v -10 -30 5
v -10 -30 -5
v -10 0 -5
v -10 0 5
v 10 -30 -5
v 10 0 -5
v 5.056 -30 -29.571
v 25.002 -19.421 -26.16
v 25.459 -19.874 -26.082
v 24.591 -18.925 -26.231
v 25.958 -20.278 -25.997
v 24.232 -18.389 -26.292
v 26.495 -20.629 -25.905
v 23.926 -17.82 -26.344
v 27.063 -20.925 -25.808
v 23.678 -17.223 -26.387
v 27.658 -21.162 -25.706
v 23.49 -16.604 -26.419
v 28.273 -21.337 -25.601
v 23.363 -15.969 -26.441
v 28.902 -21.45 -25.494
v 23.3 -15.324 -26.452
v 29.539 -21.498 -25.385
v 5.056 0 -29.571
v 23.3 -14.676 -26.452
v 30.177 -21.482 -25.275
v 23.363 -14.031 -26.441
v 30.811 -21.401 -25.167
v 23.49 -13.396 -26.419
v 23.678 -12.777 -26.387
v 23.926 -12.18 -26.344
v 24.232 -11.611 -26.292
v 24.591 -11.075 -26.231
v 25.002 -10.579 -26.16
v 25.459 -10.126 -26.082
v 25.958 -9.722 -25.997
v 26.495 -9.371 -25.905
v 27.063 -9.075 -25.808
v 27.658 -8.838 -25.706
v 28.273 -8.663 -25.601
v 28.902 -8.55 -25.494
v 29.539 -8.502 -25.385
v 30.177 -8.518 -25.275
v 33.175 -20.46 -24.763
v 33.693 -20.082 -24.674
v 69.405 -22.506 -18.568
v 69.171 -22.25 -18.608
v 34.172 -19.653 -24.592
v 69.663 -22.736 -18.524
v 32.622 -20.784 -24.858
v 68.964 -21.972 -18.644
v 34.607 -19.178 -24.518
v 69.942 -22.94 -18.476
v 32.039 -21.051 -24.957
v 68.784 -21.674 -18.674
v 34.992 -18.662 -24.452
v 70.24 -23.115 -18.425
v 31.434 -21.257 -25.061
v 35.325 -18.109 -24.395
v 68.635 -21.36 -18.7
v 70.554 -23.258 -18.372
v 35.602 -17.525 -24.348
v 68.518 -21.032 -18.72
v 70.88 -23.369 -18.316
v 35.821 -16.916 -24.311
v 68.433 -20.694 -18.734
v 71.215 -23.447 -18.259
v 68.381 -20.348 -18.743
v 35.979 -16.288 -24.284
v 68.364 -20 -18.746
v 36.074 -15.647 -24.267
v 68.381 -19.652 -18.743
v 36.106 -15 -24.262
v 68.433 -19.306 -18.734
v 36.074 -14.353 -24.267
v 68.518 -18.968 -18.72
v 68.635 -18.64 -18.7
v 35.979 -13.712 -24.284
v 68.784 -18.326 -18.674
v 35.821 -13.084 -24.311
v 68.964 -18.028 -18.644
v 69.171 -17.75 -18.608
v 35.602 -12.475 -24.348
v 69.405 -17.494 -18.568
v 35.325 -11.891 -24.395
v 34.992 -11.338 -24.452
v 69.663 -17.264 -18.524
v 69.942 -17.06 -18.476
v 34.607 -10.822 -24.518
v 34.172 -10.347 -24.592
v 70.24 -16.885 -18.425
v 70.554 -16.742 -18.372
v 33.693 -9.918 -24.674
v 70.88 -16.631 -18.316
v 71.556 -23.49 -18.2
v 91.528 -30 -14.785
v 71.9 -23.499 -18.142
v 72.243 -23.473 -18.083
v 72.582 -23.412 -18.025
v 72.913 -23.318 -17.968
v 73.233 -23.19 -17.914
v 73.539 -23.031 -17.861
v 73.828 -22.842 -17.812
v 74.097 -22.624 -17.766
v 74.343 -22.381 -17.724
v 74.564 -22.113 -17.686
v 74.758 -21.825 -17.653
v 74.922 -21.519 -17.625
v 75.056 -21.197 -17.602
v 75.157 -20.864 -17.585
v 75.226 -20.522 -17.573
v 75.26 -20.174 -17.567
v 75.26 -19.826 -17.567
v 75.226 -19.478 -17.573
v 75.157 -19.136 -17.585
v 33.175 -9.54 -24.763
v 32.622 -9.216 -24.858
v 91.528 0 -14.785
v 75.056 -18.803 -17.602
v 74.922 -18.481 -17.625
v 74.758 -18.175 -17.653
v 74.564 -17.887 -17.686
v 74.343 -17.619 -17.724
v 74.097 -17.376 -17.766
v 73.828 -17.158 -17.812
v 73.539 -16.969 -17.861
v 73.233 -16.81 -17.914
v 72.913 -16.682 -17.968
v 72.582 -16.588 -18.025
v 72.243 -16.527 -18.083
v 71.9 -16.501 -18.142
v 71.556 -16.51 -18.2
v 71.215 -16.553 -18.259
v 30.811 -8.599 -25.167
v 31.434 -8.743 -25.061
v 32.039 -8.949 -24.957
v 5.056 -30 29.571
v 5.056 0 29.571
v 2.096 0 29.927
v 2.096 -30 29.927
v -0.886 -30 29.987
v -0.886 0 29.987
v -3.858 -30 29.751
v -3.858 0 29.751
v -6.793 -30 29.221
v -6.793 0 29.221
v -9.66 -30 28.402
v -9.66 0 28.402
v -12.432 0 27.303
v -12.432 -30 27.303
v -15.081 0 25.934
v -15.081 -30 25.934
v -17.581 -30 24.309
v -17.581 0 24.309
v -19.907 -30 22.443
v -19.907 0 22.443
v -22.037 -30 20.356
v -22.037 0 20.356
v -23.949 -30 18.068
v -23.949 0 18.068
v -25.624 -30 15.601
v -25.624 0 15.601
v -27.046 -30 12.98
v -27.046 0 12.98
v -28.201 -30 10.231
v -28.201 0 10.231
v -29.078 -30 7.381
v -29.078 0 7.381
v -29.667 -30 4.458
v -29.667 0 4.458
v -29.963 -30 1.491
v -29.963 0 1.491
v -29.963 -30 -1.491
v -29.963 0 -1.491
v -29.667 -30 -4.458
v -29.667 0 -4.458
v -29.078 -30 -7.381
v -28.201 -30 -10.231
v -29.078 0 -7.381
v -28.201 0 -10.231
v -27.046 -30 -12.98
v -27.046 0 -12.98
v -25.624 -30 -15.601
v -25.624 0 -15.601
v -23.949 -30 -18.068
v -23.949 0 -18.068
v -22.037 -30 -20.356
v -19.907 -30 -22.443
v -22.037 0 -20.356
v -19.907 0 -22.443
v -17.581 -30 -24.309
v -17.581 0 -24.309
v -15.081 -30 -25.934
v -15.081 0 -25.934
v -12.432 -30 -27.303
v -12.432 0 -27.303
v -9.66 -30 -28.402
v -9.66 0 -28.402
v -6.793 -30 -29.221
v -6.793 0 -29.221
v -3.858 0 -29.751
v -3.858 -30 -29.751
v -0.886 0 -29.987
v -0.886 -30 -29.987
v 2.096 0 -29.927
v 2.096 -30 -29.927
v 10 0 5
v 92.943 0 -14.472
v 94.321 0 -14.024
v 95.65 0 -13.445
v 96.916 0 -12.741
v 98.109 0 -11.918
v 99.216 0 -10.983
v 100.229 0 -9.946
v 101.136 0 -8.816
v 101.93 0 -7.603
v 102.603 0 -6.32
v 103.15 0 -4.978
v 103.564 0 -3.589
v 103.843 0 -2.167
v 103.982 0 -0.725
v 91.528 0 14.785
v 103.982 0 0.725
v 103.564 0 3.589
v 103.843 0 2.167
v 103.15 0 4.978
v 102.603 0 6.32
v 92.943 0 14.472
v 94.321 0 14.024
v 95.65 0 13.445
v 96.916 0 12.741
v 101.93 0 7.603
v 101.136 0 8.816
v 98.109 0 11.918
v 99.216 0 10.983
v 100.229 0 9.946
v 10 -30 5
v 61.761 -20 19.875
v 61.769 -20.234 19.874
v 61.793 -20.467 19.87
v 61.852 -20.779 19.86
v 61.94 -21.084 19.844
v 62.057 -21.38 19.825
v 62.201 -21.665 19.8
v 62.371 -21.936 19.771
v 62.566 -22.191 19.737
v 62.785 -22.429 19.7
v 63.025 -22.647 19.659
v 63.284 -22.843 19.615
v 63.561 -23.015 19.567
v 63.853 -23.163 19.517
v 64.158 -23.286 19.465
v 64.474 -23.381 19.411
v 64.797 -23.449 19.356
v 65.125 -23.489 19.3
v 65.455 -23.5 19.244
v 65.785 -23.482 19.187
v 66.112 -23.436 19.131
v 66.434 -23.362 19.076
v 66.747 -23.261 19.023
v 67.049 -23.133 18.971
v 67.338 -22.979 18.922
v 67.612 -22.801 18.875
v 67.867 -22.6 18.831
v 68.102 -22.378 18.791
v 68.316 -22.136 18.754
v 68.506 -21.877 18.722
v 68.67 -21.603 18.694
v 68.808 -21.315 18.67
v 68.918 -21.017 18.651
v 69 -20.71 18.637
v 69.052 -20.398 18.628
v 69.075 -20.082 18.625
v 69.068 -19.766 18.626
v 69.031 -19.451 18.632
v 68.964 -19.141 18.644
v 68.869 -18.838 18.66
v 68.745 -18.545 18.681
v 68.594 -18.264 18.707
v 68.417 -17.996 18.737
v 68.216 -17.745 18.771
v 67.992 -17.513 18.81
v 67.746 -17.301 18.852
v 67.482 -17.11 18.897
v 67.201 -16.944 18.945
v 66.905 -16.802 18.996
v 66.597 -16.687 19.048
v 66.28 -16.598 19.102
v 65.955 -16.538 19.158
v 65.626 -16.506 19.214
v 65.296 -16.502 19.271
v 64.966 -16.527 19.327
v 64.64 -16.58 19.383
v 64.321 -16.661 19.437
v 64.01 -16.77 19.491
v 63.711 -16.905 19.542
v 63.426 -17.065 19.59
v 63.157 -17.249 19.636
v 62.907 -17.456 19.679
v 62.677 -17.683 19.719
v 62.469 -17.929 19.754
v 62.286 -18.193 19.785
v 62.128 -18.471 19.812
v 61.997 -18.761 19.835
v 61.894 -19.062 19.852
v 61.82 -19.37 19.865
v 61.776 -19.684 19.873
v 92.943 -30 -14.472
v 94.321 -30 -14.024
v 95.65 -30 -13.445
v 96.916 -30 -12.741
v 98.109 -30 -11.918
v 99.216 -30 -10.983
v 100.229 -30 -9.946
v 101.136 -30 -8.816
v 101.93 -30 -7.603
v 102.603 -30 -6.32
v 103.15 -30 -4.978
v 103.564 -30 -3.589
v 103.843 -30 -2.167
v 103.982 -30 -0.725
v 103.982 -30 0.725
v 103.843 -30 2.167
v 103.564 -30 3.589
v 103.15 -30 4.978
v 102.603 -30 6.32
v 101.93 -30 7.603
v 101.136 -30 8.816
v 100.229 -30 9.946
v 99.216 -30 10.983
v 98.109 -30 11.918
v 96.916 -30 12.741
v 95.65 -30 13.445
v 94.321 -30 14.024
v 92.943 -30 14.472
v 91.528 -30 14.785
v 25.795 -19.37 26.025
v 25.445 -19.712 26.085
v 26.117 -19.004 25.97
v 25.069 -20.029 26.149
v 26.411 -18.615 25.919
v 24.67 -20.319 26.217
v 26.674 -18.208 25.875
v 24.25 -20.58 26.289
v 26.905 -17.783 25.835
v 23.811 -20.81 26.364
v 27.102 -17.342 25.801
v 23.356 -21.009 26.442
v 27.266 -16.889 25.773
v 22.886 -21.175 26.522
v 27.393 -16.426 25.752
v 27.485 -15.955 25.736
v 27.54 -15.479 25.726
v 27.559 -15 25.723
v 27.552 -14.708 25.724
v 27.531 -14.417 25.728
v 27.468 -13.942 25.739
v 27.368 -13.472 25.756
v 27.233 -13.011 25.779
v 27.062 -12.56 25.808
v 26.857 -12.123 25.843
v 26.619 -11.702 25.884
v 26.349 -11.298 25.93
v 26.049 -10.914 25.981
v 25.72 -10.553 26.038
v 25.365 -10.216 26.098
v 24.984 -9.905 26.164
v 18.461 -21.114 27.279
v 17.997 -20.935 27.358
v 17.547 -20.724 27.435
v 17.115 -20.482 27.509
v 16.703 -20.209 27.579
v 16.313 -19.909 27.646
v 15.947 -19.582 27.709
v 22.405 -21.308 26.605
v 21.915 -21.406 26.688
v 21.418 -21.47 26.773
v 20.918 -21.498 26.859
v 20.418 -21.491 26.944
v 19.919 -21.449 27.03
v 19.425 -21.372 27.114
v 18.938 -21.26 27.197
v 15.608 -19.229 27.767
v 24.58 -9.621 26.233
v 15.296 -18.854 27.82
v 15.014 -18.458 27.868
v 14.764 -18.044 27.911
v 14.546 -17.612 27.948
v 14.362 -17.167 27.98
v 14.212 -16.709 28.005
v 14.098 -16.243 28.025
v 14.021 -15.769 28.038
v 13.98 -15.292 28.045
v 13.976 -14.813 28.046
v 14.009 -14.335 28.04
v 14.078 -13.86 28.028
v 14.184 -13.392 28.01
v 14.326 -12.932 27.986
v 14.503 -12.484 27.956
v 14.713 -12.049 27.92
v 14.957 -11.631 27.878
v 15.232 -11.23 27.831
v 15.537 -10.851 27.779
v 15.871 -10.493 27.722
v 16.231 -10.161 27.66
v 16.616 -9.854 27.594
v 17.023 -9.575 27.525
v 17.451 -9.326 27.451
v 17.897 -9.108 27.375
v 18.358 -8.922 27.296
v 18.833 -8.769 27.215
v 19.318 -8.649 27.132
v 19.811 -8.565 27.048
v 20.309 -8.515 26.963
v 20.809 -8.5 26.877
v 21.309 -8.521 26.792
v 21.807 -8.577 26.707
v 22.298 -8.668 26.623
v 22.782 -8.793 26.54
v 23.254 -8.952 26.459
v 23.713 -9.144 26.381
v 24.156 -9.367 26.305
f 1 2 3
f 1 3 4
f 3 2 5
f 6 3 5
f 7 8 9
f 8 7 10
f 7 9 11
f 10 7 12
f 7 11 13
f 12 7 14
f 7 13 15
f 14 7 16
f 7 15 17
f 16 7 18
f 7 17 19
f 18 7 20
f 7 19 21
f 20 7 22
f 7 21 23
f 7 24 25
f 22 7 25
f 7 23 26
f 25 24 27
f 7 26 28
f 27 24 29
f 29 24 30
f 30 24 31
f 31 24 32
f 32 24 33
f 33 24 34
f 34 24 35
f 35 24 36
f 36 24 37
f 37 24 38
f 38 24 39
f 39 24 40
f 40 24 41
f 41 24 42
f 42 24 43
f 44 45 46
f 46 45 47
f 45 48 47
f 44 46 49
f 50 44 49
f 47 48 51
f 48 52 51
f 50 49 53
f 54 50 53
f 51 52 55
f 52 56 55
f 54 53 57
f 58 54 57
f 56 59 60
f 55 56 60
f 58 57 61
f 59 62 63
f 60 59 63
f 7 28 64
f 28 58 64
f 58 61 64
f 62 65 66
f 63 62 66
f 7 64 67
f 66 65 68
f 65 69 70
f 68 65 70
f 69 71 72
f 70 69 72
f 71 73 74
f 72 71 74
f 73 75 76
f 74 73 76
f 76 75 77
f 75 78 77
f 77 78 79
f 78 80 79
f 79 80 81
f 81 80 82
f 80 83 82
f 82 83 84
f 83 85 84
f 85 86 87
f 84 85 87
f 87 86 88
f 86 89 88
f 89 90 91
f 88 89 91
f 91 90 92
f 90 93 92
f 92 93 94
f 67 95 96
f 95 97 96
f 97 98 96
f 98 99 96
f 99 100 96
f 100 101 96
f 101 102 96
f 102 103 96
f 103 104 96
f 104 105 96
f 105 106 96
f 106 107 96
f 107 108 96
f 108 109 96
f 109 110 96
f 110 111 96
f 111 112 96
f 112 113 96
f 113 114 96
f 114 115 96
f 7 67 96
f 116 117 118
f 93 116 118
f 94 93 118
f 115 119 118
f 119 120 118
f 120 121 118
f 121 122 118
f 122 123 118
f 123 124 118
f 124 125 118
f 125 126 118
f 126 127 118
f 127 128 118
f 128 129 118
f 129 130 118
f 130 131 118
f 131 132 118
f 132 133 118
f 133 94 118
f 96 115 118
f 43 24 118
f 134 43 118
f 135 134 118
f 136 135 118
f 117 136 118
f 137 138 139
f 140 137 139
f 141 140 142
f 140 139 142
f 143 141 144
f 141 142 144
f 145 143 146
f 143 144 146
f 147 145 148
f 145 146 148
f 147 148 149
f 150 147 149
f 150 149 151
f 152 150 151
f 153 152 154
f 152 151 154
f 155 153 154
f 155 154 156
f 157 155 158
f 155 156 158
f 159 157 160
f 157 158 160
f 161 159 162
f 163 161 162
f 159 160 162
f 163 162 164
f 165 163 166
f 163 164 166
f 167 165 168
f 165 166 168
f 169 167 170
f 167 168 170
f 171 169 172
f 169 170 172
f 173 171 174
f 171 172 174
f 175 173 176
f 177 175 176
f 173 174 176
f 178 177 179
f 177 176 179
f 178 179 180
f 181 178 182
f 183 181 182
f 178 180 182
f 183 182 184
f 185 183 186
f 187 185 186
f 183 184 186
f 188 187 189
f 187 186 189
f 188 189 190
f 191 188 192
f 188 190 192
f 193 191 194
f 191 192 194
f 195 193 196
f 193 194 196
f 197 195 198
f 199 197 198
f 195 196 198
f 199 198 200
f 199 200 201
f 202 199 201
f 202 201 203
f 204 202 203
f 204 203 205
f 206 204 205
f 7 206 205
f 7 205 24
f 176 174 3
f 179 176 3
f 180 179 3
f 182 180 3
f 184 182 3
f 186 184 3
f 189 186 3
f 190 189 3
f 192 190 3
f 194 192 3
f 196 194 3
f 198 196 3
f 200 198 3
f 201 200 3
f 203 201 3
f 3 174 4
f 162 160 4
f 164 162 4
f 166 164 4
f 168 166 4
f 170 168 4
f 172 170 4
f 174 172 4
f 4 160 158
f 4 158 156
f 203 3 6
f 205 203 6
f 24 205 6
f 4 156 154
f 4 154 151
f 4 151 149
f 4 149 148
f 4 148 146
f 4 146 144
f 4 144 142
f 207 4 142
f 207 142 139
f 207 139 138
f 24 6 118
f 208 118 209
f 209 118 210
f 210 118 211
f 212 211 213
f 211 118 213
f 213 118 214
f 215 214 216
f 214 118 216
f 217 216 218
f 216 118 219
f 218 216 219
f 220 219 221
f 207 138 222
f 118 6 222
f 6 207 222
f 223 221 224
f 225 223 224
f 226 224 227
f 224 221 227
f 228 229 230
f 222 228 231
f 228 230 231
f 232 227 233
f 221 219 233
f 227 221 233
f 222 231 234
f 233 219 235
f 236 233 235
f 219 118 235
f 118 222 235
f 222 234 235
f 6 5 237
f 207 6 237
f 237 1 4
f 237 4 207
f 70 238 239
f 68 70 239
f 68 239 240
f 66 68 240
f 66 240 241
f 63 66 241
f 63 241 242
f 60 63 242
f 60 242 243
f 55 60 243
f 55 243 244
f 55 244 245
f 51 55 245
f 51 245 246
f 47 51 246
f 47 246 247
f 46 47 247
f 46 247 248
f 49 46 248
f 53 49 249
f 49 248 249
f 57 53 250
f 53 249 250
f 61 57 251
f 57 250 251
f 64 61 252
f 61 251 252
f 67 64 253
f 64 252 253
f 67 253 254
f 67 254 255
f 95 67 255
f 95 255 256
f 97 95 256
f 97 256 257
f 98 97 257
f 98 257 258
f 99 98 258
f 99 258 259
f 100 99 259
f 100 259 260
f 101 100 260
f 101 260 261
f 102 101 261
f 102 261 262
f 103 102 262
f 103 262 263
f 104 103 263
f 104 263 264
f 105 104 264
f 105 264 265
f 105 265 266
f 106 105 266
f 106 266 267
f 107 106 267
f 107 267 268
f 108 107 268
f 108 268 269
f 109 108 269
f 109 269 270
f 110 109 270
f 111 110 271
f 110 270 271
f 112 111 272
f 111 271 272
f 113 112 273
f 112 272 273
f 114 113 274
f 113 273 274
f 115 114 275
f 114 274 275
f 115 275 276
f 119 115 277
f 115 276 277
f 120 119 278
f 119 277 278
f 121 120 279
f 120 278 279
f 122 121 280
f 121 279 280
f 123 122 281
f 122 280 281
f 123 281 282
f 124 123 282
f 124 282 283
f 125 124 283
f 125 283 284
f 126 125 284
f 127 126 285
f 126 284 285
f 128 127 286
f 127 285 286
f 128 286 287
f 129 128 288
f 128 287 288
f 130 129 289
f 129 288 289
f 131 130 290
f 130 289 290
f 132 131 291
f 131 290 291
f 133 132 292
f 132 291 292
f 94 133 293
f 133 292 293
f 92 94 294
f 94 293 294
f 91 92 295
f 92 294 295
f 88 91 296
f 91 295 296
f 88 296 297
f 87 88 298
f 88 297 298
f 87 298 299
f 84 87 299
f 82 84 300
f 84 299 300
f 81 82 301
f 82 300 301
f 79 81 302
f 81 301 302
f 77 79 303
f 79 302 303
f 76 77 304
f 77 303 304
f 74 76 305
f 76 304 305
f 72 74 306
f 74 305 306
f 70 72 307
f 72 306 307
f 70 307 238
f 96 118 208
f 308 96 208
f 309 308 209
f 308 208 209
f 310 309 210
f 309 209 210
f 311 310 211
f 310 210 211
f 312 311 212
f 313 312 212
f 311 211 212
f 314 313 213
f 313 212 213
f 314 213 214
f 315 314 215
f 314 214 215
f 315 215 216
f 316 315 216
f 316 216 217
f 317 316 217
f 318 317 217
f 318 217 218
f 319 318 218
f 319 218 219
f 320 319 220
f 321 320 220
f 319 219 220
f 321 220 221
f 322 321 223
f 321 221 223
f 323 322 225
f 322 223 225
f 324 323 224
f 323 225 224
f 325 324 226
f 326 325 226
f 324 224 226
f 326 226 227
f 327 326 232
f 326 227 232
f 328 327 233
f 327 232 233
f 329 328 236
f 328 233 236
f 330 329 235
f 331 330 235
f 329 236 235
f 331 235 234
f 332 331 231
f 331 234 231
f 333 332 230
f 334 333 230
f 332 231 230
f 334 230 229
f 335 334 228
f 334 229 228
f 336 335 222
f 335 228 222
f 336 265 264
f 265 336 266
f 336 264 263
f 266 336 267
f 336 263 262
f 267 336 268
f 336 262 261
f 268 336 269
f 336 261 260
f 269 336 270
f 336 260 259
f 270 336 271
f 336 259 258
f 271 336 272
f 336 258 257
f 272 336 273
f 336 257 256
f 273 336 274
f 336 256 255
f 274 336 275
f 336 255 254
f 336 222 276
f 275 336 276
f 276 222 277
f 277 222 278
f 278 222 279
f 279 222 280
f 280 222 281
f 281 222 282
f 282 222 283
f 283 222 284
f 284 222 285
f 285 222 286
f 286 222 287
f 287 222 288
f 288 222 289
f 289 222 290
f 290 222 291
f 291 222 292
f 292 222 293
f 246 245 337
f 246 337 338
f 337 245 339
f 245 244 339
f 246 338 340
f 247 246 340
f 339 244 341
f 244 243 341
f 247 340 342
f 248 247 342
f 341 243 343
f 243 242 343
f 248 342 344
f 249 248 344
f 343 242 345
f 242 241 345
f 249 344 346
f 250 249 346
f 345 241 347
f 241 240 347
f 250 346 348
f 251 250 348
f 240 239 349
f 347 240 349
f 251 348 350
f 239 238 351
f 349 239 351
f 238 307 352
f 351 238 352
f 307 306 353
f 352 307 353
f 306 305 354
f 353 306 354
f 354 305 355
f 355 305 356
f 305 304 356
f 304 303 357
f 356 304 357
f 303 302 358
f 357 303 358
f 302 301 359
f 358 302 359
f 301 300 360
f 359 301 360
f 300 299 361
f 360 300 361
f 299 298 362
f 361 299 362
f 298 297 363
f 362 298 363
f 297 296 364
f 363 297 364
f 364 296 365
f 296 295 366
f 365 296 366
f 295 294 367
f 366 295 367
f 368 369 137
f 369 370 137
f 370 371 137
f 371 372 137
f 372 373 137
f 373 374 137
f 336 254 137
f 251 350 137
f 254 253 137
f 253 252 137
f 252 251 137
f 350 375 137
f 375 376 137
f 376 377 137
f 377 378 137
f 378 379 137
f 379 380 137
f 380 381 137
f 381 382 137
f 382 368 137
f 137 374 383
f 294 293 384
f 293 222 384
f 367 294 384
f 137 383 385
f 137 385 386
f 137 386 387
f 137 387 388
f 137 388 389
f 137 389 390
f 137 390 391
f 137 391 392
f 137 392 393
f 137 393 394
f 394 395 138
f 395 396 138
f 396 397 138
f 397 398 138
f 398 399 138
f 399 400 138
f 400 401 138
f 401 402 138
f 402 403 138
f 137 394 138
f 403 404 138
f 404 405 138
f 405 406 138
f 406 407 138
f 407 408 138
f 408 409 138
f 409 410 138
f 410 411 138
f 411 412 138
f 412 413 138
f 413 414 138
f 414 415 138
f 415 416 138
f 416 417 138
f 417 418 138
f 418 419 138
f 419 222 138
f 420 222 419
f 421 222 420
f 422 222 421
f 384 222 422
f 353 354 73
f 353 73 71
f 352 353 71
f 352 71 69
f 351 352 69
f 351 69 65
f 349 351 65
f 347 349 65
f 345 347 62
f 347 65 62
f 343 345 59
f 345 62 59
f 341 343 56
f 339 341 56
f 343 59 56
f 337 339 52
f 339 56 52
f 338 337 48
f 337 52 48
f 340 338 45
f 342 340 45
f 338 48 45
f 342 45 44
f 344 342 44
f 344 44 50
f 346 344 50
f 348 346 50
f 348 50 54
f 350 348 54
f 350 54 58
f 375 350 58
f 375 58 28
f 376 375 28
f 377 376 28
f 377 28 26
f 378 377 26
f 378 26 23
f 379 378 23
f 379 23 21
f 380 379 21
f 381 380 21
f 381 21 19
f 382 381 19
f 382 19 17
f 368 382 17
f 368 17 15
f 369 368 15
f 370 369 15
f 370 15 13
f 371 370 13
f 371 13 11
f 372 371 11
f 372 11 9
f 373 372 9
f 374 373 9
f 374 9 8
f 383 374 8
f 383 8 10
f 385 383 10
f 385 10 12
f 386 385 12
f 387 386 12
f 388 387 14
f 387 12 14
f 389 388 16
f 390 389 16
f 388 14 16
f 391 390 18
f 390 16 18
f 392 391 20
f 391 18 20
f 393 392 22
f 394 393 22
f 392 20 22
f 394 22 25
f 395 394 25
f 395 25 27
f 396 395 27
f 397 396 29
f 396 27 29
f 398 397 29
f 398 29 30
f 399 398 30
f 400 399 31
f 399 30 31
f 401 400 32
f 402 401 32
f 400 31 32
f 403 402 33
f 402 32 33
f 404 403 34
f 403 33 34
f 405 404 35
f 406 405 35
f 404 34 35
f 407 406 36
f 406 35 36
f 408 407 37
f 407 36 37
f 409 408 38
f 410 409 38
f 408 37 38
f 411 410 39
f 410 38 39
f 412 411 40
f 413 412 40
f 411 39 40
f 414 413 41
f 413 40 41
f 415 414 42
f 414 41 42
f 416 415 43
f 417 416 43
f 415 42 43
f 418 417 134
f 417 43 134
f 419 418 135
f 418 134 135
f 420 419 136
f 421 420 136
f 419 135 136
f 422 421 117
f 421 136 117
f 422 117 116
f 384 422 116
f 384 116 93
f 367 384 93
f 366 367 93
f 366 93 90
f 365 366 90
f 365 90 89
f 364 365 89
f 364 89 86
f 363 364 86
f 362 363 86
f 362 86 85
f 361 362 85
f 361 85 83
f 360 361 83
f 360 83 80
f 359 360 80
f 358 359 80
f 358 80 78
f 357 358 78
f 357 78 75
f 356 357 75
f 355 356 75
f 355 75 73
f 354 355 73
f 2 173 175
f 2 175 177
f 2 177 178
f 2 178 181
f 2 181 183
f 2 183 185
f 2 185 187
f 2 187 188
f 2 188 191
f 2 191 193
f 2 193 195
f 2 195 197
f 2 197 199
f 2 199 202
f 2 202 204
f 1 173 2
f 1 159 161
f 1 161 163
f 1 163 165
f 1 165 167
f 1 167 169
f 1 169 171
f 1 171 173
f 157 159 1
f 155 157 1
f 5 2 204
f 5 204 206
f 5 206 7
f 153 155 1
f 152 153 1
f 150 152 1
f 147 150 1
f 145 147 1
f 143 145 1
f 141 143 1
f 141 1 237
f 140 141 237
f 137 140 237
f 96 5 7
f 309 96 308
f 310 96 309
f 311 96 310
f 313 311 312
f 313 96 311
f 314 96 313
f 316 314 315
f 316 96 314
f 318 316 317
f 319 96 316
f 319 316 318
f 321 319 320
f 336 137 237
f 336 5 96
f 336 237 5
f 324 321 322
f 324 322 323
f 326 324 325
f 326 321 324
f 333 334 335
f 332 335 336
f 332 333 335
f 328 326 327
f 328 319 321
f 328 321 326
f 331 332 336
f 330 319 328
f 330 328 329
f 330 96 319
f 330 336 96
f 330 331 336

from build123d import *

# Parameters (mm, degrees)
F1_DEPTH = 30
F2_W     = 20
F2_H     = 10
F3_DEPTH = 30
F4_R     = 6.5
F5_DEPTH = 64.6280276847
F7_D     = 7


with BuildPart() as f1:
    # F0 (on Front) → F1 (new body)
    with BuildSketch(Plane.XZ):
        with BuildLine():
            Line((91.5280898876, 14.7854239547), (5.0561797753, 29.5708479094))
            ThreePointArc((5.0561797753, 29.5708479094), (-30, 0), (5.0561797753, -29.5708479094))
            Line((5.0561797753, -29.5708479094), (91.5280898876, -14.7854239547))
            ThreePointArc((91.5280898876, -14.7854239547), (104, 0), (91.5280898876, 14.7854239547))
        make_face()
    extrude(amount=F1_DEPTH)

    # F2 (on face) → F3 (cut)
    with BuildSketch(Plane.XZ.offset(30)):
        Rectangle(F2_W, F2_H)
    extrude(amount=-F3_DEPTH, mode=Mode.SUBTRACT)

    # F4 (on face) → F5 (cut, through all)
    with BuildSketch(Plane(origin=(5.0561797753, 0, -29.5708479094), x_dir=(0.9856949303, 0, 0.1685393258), z_dir=(0.1685393258, 0, -0.9856949303))):
        with Locations((25, 15)):
            Circle(F4_R)
    extrude(amount=-F5_DEPTH, mode=Mode.SUBTRACT)

    # F7 (through all)
    with Locations(Plane(origin=(5.0561797753, 0, -29.5708479094), x_dir=(0.9856949303, 0, 0.1685393258), z_dir=(0.1685393258, 0, -0.9856949303))):
        with Locations((67.7268487978, 20)):
            Hole(F7_D / 2)


solid = f1.part
